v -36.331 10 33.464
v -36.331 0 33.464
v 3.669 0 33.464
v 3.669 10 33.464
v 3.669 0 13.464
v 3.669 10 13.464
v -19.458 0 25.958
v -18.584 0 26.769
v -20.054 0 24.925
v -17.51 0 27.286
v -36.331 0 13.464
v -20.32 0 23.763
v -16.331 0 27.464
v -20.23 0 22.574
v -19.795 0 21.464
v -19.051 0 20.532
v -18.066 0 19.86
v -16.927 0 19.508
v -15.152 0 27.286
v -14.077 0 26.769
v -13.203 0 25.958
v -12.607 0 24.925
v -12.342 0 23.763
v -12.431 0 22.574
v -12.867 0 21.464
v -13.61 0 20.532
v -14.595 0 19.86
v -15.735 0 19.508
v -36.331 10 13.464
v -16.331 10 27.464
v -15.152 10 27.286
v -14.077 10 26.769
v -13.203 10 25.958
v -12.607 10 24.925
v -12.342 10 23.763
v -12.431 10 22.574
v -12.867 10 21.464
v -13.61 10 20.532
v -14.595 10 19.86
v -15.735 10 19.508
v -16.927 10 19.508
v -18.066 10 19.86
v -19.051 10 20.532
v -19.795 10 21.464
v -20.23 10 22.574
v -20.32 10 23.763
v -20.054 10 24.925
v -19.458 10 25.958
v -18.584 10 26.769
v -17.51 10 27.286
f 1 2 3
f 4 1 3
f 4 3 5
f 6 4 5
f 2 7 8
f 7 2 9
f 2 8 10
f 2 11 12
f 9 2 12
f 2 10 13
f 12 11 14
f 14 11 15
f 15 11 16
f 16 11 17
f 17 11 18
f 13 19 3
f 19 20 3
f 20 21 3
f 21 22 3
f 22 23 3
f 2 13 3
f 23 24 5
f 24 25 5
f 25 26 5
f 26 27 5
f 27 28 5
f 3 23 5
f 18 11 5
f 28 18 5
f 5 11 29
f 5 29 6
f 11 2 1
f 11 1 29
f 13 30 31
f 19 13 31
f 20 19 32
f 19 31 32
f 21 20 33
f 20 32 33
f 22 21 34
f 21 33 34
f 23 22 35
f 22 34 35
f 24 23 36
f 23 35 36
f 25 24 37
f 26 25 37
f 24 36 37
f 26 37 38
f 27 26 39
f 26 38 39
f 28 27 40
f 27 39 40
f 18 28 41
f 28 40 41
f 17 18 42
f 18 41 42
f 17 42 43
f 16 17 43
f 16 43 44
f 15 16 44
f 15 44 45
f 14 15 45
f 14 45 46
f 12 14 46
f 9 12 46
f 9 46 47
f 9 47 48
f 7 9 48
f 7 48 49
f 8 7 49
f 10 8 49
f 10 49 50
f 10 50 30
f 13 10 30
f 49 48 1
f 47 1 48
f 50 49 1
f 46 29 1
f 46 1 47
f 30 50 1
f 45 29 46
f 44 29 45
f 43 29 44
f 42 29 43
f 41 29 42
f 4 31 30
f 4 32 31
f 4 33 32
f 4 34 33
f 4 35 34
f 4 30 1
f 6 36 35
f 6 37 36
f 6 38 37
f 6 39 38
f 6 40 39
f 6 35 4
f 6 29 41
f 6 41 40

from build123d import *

# Parameters (mm, degrees)
SKETCH2_W           = 40
SKETCH2_H           = 20
BOSS_EXTRUDE1_DEPTH = 10
CUT_EXTRUDE1_REACH  = 52.396
SKETCH3_R           = 4


with BuildPart() as part:
    # Sketch2 → Boss-Extrude1 (new body)
    with BuildSketch(Plane(origin=(0, 0, 0), x_dir=(1, 0, 0), z_dir=(0, 1, 0))):
        with Locations((-16.330703266, -23.463822806)):
            Rectangle(SKETCH2_W, SKETCH2_H)
    extrude(amount=BOSS_EXTRUDE1_DEPTH)

    # Sketch3 → Cut-Extrude1 (cut, up to next)
    with BuildSketch(Plane(origin=(0, 10, 0), x_dir=(1, 0, 0), z_dir=(0, 1, 0)), mode=Mode.PRIVATE) as cut_extrude1_sk1:
        with Locations(Location((-16.330703266, -23.463822806, 0), (0, 0, 270))):
            Circle(SKETCH3_R)
    cut_extrude1_tool1 = extrude(cut_extrude1_sk1.sketch, amount=-CUT_EXTRUDE1_REACH, mode=Mode.PRIVATE) & part.part
    add(cut_extrude1_tool1.solids().sort_by_distance((-16.330703, 10, 23.463823))[0], mode=Mode.SUBTRACT)


solid = part.part
